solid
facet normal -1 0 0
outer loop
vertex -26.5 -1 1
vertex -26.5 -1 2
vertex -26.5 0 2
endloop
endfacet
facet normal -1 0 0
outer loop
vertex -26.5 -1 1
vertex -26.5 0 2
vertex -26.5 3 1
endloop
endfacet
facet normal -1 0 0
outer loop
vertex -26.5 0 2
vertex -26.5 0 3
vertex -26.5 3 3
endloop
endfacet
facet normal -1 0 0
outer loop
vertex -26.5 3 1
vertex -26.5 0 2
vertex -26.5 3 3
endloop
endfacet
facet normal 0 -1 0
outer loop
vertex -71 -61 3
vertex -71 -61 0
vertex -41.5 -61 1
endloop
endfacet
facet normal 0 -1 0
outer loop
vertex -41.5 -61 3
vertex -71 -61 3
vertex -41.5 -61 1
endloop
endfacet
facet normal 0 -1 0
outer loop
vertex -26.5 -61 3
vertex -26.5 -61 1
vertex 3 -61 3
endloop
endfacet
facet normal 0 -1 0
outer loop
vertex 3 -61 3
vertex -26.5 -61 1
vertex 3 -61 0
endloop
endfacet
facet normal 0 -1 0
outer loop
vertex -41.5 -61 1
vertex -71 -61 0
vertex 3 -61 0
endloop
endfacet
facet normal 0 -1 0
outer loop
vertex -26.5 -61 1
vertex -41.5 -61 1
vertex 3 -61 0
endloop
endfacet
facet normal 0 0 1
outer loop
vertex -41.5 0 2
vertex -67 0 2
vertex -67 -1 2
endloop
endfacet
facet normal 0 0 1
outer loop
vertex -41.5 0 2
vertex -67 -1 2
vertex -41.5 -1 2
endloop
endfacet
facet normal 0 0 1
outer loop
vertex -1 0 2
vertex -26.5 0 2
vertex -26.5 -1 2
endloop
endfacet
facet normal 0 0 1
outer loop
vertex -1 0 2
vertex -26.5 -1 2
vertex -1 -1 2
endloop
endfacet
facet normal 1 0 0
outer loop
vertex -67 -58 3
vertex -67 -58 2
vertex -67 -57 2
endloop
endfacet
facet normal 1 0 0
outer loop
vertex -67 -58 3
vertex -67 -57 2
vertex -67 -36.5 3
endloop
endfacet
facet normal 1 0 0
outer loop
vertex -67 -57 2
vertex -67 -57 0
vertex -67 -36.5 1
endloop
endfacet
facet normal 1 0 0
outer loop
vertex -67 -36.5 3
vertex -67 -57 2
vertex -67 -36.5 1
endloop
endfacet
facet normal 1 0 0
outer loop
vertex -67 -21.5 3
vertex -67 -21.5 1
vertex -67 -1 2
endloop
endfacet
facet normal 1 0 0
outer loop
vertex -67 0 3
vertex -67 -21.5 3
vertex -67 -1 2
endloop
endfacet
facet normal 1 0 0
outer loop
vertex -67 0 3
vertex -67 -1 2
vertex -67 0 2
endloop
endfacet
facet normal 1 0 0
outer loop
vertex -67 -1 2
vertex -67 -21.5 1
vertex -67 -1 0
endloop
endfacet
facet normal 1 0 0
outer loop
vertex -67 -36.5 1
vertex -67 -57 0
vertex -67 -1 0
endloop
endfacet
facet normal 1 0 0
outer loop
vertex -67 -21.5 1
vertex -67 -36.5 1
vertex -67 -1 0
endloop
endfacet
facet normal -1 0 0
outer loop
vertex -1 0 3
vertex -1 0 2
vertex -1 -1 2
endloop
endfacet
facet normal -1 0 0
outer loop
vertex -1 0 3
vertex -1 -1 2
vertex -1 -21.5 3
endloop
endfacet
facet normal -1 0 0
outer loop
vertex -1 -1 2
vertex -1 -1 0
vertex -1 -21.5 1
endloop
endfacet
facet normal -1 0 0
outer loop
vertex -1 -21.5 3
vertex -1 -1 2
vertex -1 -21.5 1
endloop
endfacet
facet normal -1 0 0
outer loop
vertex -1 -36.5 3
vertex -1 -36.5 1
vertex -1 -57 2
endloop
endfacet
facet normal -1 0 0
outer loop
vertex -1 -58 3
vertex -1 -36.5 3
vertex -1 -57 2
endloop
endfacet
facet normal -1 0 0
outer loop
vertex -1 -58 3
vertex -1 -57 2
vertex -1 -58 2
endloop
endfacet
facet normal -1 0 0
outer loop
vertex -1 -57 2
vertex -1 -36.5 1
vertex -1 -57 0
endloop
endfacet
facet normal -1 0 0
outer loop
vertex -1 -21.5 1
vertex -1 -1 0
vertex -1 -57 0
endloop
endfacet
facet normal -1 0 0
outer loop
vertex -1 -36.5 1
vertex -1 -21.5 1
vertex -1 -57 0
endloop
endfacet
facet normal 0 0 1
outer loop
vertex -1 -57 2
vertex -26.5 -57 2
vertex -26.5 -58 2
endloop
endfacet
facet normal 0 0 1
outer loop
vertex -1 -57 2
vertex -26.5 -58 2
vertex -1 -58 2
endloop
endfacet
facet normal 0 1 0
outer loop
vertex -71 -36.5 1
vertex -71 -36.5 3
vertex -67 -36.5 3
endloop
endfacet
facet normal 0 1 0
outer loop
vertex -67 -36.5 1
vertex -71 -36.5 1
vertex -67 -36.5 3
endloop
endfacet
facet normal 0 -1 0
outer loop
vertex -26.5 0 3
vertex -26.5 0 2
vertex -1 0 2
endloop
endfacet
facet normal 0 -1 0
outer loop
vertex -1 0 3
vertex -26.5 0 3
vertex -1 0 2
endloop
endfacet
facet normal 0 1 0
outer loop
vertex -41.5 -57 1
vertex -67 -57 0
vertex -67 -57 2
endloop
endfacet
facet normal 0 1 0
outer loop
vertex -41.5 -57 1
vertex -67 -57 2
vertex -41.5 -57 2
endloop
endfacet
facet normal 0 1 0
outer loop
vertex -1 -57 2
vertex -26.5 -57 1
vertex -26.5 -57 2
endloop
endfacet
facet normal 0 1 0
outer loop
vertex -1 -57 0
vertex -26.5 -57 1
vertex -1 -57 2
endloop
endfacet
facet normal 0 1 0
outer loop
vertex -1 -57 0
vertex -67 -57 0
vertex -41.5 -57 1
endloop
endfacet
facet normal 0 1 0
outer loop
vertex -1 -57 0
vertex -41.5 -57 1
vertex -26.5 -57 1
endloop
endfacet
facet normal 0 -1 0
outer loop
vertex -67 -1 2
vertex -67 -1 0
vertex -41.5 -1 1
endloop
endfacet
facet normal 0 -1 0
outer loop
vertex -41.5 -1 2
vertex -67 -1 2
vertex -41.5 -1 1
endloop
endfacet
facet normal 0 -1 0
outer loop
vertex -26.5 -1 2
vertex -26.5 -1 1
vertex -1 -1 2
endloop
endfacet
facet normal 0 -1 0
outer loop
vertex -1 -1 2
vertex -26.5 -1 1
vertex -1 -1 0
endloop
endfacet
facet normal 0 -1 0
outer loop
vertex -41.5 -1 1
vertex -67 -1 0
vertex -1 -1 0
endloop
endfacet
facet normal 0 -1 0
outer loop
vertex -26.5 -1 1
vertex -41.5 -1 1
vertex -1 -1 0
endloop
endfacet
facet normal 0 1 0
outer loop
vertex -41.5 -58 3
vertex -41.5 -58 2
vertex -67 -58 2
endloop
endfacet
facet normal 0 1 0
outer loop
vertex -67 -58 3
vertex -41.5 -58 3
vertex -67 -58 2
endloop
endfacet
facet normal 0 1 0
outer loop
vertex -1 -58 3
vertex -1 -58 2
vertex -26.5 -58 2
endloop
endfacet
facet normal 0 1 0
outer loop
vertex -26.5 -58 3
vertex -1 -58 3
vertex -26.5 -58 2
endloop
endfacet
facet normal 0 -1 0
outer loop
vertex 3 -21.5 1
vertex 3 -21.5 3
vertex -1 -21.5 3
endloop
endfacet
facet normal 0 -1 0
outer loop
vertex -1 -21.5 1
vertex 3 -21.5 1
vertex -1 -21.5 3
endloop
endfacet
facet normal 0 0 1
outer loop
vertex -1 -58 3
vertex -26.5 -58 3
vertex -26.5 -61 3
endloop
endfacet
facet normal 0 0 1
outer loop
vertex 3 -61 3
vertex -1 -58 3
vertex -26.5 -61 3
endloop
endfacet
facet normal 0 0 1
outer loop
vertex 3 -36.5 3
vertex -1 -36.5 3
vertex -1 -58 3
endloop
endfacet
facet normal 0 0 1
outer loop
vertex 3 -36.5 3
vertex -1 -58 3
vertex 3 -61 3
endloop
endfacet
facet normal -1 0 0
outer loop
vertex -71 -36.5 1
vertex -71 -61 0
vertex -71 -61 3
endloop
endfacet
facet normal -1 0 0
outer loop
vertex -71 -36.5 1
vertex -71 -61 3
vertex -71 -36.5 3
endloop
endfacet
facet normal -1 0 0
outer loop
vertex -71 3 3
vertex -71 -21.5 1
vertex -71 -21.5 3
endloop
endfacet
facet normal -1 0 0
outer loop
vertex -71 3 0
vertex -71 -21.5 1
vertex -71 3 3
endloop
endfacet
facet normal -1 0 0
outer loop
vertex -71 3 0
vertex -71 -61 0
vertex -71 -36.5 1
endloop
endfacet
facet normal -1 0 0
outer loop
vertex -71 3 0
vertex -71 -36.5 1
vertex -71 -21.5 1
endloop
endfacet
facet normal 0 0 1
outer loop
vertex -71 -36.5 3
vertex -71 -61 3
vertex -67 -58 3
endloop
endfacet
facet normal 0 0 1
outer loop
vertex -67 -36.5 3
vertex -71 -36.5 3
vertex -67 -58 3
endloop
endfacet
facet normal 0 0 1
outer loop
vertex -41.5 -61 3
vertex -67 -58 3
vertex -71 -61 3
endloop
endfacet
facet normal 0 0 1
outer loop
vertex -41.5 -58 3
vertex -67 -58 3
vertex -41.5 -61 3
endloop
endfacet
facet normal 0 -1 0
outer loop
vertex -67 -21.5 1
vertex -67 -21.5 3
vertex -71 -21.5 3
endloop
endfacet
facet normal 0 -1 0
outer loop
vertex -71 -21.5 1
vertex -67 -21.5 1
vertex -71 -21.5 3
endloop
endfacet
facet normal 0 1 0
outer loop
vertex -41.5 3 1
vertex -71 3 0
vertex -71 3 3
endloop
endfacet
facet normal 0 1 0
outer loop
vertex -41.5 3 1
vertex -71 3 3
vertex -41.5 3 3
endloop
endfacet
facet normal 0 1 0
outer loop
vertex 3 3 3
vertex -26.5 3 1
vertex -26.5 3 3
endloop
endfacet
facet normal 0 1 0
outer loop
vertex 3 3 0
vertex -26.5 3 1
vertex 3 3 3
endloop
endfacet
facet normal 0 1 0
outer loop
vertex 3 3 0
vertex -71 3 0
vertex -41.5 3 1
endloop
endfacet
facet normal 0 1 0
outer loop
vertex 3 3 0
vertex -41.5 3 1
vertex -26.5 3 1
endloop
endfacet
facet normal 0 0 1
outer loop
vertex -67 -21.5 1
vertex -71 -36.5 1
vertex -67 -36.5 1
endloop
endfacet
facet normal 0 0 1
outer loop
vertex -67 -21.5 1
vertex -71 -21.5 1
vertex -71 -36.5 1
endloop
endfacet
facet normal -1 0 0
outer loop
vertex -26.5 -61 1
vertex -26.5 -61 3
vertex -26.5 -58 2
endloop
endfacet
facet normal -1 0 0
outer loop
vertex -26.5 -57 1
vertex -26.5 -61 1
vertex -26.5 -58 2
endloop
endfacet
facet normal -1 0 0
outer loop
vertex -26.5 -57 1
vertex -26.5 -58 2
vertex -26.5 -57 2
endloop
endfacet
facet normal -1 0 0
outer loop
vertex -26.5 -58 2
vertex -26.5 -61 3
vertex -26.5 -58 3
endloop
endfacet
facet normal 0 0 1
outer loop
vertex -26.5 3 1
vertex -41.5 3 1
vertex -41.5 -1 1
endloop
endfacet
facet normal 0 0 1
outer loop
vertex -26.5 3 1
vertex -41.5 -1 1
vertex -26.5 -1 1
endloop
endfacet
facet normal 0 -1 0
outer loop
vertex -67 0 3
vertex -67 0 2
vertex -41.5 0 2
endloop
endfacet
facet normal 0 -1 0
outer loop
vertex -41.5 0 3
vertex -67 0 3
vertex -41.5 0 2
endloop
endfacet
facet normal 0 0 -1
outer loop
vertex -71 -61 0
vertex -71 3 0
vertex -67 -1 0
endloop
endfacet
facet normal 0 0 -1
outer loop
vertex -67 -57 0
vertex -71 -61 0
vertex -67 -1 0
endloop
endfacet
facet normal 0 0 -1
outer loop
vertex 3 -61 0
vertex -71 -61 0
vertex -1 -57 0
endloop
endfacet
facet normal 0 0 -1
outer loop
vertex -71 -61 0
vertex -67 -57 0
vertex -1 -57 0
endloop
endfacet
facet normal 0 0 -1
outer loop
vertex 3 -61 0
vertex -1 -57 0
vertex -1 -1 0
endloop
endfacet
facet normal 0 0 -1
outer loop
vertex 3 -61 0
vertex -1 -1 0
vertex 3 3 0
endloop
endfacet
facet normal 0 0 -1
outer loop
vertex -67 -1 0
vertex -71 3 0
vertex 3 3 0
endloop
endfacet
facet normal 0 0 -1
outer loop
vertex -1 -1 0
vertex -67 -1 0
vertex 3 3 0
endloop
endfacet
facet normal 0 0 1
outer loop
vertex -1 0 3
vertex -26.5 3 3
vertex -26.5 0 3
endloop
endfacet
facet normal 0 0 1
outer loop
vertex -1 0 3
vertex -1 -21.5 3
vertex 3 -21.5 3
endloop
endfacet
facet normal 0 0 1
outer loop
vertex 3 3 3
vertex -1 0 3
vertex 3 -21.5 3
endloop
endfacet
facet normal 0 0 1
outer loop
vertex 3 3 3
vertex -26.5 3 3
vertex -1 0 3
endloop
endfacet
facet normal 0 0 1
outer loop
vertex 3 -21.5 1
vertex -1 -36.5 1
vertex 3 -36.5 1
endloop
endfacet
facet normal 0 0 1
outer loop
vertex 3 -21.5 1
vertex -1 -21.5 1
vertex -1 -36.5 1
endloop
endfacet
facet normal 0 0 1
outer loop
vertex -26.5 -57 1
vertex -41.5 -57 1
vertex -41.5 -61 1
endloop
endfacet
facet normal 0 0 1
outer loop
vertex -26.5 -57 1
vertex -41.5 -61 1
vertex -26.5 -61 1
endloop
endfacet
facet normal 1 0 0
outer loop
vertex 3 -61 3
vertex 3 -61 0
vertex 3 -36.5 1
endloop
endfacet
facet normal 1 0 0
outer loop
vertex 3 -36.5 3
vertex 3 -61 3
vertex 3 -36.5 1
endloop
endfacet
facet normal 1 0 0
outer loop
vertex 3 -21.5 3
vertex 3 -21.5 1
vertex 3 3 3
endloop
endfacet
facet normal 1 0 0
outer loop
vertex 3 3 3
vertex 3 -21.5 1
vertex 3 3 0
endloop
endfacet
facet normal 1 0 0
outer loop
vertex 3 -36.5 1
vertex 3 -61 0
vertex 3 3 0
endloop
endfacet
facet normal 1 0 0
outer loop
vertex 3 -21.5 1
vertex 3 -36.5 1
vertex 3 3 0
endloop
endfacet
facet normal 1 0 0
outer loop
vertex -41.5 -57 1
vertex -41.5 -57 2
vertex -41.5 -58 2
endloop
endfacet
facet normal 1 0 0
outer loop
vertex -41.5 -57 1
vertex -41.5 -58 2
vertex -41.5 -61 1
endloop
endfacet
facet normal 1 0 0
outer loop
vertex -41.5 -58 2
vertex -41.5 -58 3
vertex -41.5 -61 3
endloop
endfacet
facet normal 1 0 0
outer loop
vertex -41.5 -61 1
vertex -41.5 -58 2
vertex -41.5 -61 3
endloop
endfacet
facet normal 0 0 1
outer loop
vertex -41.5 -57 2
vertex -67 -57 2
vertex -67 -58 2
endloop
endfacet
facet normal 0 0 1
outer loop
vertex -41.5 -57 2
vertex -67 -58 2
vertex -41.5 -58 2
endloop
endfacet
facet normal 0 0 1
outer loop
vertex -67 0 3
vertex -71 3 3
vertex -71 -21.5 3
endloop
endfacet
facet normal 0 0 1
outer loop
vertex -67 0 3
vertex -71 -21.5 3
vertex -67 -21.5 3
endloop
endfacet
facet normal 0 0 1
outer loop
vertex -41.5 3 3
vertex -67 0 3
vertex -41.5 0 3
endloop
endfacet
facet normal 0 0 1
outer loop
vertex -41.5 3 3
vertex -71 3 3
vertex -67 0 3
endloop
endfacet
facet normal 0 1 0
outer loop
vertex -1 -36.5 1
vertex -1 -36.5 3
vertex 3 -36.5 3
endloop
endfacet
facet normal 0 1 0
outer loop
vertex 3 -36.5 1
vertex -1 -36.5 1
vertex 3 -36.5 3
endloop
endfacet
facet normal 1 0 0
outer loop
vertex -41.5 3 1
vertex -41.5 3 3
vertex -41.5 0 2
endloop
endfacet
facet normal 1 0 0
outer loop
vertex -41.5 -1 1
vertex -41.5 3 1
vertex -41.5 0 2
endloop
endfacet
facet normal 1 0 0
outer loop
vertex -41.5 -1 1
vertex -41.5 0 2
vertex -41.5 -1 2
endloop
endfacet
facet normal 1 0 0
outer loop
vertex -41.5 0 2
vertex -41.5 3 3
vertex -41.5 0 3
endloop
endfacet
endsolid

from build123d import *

# Parameters (mm, degrees)
F0_W     = 74
F0_H     = 64
F0_W_2   = 68
F0_H_2   = 58
F0_W_3   = 66
F0_H_3   = 56
F1_DEPTH = 2
F2_W     = 74
F2_H     = 64
F3_DEPTH = 1
F4_W     = 15
F4_H     = 6.5584733043
F4_H_2   = 3
F4_H_3   = 6.1532862581
F4_W_2   = 4
F4_H_4   = 15
F4_W_3   = 1.5584733043
F4_W_4   = 10.1532862581
F5_DEPTH = 2


with BuildPart() as f1:
    # F0 (on Top) → F1 (new body)
    with BuildSketch(Plane.XY):
        with Locations((-34, -29)):
            Rectangle(F0_W, F0_H)
        with Locations((-34, -29)):
            Rectangle(F0_W_2, F0_H_2, mode=Mode.SUBTRACT)
        with Locations((-34, -29)):
            Rectangle(F0_W_2, F0_H_2)
        with Locations((-34, -29)):
            Rectangle(F0_W_3, F0_H_3, mode=Mode.SUBTRACT)
    extrude(amount=F1_DEPTH)

    # F2 (on face) → F3 (join)
    with BuildSketch(Plane.XY.offset(2)):
        with Locations((-34, -29)):
            Rectangle(F2_W, F2_H)
        Polygon((-67, 0), (-1, 0), (-1, -1), (-1, -57), (-1, -58), (-67, -58), (-67, -57), (-67, -1), align=None, mode=Mode.SUBTRACT)
    extrude(amount=F3_DEPTH)

    # F4 (on face) → F5 (cut)
    with BuildSketch(Plane.XY.offset(3)):
        with Locations((-34, 6.2792366521)):
            Rectangle(F4_W, F4_H)
        with Locations((-34, 1.5)):
            Rectangle(F4_W, F4_H_2)
        with Locations((-34, -3.0766431291)):
            Rectangle(F4_W, F4_H_3)
        with Locations((1, -29)):
            Rectangle(F4_W_2, F4_H_4)
        with Locations((3.7792366521, -29)):
            Rectangle(F4_W_3, F4_H_4)
        with Locations((-6.0766431291, -29)):
            Rectangle(F4_W_4, F4_H_4)
        with Locations((-34, -59.5)):
            Rectangle(F4_W, F4_H_2)
        with Locations((-34, -54.9233568709)):
            Rectangle(F4_W, F4_H_3)
        with Locations((-34, -64.2792366521)):
            Rectangle(F4_W, F4_H)
        with Locations((-61.9233568709, -29)):
            Rectangle(F4_W_4, F4_H_4)
        with Locations((-69, -29)):
            Rectangle(F4_W_2, F4_H_4)
        with Locations((-71.7792366521, -29)):
            Rectangle(F4_W_3, F4_H_4)
    extrude(amount=-F5_DEPTH, mode=Mode.SUBTRACT)


solid = f1.part
